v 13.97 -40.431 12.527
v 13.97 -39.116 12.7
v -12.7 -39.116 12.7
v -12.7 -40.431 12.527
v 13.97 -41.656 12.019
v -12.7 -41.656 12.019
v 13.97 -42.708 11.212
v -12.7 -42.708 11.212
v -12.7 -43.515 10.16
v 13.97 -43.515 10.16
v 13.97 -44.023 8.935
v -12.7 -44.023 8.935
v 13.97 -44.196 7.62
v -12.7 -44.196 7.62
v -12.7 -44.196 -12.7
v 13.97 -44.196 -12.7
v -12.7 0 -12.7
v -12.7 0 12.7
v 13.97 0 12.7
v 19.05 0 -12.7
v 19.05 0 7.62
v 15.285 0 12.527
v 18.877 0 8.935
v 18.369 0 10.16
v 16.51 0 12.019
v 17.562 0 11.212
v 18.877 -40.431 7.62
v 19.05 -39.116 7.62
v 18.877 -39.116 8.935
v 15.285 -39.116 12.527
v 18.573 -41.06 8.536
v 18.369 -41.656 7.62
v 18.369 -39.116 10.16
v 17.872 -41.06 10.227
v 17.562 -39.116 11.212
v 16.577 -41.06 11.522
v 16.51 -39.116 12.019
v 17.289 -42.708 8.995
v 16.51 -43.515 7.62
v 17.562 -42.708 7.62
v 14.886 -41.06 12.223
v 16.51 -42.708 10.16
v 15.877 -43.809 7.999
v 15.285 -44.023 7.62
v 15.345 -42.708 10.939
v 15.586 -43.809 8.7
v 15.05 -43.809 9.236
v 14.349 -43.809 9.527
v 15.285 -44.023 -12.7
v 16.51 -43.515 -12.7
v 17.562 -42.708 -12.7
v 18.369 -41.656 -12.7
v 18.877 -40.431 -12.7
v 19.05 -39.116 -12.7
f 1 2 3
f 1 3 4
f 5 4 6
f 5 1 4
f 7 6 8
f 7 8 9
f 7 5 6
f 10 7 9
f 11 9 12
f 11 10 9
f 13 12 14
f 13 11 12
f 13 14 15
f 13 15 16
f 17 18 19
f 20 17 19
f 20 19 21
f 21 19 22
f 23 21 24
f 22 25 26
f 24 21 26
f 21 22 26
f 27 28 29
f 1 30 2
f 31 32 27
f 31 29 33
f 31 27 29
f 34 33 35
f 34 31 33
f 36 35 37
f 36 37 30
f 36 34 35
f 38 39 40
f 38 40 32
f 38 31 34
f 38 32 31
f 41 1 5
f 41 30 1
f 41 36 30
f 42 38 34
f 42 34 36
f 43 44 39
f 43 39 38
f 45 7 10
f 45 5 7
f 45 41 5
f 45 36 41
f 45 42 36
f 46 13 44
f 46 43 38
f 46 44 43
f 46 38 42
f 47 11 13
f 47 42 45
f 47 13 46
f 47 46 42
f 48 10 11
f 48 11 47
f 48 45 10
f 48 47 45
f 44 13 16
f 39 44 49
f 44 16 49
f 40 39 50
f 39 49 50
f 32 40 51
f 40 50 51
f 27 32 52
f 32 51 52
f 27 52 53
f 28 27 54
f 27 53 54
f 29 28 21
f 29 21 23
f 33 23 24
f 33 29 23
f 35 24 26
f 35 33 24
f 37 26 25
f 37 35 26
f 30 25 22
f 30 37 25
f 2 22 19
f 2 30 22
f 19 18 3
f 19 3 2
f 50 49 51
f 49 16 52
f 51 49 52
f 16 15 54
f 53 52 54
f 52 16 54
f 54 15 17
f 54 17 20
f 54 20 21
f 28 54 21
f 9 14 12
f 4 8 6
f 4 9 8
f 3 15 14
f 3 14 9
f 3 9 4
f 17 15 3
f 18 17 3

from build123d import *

# Parameters (mm, degrees)
F0_W        = 31.75
F0_H        = 25.4
F1_DEPTH    = 44.196
F2_R        = 5.08
F3_T1_DEPTH = 33.02
F3_S5_W     = 5.08
F3_S5_H     = 5.08
F3_T6_DEPTH = 5.08


# Not quite as in the source:
# - a fillet or chamfer that OpenCascade refuses, or shapes differently, is made with other operations: its cross-section is extruded or revolved along the edge and cut away or added


with BuildPart() as f1:
    # F0 (on Front) → F1 (new body)
    with BuildSketch(Plane.XZ):
        with Locations((3.175, 0)):
            Rectangle(F0_W, F0_H)
    extrude(amount=F1_DEPTH)

    # F2
    f2_edges = [f1.edges().sort_by_distance(p)[0] for p in [
        (3.175, -44.196, 12.7),
        (19.05, -22.098, 12.7),
    ]]
    fillet(f2_edges, radius=F2_R)

    # F3: fillet of radius 5.08 on 1 edges, made by hand

    # F3_s2 → F3_t1 (cut)
    with BuildSketch(Plane.XY.offset(-25.4)):
        with BuildLine():
            ThreePointArc((13.97, -44.196), (17.5621024484, -42.7081024484), (19.05, -39.116))
            Line((19.05, -39.116), (19.05, -44.196))
            Line((19.05, -44.196), (13.97, -44.196))
        make_face()
    extrude(amount=F3_T1_DEPTH, mode=Mode.SUBTRACT)


with BuildPart() as f3_tool4:
    # F3_s5 → F3_t6 (new body)
    with BuildSketch(Plane.XZ.offset(39.116)):
        with Locations((16.51, 10.16)):
            Rectangle(F3_S5_W, F3_S5_H)
    extrude(amount=F3_T6_DEPTH)

    # F3_s7 → F3_t8 (revolve, cut)
    with BuildSketch(Plane(origin=(13.97, -39.116, 7.62), x_dir=(-0.7071067812, 0, -0.7071067812), z_dir=(-0.7071067812, 0, 0.7071067812))):
        with BuildLine():
            ThreePointArc((0, -5.08), (5.08, 0), (0, 5.08))
            Line((0, 5.08), (0, -5.08))
        make_face()
    revolve(axis=Axis((13.97, -39.116, 7.62), (0, -1, 0)), mode=Mode.SUBTRACT)


with BuildPart() as f1_1:
    add(f1.part)

    # F3_t3: cut F3_tool4
    add(f3_tool4.part, mode=Mode.SUBTRACT)


solid = f1_1.part
